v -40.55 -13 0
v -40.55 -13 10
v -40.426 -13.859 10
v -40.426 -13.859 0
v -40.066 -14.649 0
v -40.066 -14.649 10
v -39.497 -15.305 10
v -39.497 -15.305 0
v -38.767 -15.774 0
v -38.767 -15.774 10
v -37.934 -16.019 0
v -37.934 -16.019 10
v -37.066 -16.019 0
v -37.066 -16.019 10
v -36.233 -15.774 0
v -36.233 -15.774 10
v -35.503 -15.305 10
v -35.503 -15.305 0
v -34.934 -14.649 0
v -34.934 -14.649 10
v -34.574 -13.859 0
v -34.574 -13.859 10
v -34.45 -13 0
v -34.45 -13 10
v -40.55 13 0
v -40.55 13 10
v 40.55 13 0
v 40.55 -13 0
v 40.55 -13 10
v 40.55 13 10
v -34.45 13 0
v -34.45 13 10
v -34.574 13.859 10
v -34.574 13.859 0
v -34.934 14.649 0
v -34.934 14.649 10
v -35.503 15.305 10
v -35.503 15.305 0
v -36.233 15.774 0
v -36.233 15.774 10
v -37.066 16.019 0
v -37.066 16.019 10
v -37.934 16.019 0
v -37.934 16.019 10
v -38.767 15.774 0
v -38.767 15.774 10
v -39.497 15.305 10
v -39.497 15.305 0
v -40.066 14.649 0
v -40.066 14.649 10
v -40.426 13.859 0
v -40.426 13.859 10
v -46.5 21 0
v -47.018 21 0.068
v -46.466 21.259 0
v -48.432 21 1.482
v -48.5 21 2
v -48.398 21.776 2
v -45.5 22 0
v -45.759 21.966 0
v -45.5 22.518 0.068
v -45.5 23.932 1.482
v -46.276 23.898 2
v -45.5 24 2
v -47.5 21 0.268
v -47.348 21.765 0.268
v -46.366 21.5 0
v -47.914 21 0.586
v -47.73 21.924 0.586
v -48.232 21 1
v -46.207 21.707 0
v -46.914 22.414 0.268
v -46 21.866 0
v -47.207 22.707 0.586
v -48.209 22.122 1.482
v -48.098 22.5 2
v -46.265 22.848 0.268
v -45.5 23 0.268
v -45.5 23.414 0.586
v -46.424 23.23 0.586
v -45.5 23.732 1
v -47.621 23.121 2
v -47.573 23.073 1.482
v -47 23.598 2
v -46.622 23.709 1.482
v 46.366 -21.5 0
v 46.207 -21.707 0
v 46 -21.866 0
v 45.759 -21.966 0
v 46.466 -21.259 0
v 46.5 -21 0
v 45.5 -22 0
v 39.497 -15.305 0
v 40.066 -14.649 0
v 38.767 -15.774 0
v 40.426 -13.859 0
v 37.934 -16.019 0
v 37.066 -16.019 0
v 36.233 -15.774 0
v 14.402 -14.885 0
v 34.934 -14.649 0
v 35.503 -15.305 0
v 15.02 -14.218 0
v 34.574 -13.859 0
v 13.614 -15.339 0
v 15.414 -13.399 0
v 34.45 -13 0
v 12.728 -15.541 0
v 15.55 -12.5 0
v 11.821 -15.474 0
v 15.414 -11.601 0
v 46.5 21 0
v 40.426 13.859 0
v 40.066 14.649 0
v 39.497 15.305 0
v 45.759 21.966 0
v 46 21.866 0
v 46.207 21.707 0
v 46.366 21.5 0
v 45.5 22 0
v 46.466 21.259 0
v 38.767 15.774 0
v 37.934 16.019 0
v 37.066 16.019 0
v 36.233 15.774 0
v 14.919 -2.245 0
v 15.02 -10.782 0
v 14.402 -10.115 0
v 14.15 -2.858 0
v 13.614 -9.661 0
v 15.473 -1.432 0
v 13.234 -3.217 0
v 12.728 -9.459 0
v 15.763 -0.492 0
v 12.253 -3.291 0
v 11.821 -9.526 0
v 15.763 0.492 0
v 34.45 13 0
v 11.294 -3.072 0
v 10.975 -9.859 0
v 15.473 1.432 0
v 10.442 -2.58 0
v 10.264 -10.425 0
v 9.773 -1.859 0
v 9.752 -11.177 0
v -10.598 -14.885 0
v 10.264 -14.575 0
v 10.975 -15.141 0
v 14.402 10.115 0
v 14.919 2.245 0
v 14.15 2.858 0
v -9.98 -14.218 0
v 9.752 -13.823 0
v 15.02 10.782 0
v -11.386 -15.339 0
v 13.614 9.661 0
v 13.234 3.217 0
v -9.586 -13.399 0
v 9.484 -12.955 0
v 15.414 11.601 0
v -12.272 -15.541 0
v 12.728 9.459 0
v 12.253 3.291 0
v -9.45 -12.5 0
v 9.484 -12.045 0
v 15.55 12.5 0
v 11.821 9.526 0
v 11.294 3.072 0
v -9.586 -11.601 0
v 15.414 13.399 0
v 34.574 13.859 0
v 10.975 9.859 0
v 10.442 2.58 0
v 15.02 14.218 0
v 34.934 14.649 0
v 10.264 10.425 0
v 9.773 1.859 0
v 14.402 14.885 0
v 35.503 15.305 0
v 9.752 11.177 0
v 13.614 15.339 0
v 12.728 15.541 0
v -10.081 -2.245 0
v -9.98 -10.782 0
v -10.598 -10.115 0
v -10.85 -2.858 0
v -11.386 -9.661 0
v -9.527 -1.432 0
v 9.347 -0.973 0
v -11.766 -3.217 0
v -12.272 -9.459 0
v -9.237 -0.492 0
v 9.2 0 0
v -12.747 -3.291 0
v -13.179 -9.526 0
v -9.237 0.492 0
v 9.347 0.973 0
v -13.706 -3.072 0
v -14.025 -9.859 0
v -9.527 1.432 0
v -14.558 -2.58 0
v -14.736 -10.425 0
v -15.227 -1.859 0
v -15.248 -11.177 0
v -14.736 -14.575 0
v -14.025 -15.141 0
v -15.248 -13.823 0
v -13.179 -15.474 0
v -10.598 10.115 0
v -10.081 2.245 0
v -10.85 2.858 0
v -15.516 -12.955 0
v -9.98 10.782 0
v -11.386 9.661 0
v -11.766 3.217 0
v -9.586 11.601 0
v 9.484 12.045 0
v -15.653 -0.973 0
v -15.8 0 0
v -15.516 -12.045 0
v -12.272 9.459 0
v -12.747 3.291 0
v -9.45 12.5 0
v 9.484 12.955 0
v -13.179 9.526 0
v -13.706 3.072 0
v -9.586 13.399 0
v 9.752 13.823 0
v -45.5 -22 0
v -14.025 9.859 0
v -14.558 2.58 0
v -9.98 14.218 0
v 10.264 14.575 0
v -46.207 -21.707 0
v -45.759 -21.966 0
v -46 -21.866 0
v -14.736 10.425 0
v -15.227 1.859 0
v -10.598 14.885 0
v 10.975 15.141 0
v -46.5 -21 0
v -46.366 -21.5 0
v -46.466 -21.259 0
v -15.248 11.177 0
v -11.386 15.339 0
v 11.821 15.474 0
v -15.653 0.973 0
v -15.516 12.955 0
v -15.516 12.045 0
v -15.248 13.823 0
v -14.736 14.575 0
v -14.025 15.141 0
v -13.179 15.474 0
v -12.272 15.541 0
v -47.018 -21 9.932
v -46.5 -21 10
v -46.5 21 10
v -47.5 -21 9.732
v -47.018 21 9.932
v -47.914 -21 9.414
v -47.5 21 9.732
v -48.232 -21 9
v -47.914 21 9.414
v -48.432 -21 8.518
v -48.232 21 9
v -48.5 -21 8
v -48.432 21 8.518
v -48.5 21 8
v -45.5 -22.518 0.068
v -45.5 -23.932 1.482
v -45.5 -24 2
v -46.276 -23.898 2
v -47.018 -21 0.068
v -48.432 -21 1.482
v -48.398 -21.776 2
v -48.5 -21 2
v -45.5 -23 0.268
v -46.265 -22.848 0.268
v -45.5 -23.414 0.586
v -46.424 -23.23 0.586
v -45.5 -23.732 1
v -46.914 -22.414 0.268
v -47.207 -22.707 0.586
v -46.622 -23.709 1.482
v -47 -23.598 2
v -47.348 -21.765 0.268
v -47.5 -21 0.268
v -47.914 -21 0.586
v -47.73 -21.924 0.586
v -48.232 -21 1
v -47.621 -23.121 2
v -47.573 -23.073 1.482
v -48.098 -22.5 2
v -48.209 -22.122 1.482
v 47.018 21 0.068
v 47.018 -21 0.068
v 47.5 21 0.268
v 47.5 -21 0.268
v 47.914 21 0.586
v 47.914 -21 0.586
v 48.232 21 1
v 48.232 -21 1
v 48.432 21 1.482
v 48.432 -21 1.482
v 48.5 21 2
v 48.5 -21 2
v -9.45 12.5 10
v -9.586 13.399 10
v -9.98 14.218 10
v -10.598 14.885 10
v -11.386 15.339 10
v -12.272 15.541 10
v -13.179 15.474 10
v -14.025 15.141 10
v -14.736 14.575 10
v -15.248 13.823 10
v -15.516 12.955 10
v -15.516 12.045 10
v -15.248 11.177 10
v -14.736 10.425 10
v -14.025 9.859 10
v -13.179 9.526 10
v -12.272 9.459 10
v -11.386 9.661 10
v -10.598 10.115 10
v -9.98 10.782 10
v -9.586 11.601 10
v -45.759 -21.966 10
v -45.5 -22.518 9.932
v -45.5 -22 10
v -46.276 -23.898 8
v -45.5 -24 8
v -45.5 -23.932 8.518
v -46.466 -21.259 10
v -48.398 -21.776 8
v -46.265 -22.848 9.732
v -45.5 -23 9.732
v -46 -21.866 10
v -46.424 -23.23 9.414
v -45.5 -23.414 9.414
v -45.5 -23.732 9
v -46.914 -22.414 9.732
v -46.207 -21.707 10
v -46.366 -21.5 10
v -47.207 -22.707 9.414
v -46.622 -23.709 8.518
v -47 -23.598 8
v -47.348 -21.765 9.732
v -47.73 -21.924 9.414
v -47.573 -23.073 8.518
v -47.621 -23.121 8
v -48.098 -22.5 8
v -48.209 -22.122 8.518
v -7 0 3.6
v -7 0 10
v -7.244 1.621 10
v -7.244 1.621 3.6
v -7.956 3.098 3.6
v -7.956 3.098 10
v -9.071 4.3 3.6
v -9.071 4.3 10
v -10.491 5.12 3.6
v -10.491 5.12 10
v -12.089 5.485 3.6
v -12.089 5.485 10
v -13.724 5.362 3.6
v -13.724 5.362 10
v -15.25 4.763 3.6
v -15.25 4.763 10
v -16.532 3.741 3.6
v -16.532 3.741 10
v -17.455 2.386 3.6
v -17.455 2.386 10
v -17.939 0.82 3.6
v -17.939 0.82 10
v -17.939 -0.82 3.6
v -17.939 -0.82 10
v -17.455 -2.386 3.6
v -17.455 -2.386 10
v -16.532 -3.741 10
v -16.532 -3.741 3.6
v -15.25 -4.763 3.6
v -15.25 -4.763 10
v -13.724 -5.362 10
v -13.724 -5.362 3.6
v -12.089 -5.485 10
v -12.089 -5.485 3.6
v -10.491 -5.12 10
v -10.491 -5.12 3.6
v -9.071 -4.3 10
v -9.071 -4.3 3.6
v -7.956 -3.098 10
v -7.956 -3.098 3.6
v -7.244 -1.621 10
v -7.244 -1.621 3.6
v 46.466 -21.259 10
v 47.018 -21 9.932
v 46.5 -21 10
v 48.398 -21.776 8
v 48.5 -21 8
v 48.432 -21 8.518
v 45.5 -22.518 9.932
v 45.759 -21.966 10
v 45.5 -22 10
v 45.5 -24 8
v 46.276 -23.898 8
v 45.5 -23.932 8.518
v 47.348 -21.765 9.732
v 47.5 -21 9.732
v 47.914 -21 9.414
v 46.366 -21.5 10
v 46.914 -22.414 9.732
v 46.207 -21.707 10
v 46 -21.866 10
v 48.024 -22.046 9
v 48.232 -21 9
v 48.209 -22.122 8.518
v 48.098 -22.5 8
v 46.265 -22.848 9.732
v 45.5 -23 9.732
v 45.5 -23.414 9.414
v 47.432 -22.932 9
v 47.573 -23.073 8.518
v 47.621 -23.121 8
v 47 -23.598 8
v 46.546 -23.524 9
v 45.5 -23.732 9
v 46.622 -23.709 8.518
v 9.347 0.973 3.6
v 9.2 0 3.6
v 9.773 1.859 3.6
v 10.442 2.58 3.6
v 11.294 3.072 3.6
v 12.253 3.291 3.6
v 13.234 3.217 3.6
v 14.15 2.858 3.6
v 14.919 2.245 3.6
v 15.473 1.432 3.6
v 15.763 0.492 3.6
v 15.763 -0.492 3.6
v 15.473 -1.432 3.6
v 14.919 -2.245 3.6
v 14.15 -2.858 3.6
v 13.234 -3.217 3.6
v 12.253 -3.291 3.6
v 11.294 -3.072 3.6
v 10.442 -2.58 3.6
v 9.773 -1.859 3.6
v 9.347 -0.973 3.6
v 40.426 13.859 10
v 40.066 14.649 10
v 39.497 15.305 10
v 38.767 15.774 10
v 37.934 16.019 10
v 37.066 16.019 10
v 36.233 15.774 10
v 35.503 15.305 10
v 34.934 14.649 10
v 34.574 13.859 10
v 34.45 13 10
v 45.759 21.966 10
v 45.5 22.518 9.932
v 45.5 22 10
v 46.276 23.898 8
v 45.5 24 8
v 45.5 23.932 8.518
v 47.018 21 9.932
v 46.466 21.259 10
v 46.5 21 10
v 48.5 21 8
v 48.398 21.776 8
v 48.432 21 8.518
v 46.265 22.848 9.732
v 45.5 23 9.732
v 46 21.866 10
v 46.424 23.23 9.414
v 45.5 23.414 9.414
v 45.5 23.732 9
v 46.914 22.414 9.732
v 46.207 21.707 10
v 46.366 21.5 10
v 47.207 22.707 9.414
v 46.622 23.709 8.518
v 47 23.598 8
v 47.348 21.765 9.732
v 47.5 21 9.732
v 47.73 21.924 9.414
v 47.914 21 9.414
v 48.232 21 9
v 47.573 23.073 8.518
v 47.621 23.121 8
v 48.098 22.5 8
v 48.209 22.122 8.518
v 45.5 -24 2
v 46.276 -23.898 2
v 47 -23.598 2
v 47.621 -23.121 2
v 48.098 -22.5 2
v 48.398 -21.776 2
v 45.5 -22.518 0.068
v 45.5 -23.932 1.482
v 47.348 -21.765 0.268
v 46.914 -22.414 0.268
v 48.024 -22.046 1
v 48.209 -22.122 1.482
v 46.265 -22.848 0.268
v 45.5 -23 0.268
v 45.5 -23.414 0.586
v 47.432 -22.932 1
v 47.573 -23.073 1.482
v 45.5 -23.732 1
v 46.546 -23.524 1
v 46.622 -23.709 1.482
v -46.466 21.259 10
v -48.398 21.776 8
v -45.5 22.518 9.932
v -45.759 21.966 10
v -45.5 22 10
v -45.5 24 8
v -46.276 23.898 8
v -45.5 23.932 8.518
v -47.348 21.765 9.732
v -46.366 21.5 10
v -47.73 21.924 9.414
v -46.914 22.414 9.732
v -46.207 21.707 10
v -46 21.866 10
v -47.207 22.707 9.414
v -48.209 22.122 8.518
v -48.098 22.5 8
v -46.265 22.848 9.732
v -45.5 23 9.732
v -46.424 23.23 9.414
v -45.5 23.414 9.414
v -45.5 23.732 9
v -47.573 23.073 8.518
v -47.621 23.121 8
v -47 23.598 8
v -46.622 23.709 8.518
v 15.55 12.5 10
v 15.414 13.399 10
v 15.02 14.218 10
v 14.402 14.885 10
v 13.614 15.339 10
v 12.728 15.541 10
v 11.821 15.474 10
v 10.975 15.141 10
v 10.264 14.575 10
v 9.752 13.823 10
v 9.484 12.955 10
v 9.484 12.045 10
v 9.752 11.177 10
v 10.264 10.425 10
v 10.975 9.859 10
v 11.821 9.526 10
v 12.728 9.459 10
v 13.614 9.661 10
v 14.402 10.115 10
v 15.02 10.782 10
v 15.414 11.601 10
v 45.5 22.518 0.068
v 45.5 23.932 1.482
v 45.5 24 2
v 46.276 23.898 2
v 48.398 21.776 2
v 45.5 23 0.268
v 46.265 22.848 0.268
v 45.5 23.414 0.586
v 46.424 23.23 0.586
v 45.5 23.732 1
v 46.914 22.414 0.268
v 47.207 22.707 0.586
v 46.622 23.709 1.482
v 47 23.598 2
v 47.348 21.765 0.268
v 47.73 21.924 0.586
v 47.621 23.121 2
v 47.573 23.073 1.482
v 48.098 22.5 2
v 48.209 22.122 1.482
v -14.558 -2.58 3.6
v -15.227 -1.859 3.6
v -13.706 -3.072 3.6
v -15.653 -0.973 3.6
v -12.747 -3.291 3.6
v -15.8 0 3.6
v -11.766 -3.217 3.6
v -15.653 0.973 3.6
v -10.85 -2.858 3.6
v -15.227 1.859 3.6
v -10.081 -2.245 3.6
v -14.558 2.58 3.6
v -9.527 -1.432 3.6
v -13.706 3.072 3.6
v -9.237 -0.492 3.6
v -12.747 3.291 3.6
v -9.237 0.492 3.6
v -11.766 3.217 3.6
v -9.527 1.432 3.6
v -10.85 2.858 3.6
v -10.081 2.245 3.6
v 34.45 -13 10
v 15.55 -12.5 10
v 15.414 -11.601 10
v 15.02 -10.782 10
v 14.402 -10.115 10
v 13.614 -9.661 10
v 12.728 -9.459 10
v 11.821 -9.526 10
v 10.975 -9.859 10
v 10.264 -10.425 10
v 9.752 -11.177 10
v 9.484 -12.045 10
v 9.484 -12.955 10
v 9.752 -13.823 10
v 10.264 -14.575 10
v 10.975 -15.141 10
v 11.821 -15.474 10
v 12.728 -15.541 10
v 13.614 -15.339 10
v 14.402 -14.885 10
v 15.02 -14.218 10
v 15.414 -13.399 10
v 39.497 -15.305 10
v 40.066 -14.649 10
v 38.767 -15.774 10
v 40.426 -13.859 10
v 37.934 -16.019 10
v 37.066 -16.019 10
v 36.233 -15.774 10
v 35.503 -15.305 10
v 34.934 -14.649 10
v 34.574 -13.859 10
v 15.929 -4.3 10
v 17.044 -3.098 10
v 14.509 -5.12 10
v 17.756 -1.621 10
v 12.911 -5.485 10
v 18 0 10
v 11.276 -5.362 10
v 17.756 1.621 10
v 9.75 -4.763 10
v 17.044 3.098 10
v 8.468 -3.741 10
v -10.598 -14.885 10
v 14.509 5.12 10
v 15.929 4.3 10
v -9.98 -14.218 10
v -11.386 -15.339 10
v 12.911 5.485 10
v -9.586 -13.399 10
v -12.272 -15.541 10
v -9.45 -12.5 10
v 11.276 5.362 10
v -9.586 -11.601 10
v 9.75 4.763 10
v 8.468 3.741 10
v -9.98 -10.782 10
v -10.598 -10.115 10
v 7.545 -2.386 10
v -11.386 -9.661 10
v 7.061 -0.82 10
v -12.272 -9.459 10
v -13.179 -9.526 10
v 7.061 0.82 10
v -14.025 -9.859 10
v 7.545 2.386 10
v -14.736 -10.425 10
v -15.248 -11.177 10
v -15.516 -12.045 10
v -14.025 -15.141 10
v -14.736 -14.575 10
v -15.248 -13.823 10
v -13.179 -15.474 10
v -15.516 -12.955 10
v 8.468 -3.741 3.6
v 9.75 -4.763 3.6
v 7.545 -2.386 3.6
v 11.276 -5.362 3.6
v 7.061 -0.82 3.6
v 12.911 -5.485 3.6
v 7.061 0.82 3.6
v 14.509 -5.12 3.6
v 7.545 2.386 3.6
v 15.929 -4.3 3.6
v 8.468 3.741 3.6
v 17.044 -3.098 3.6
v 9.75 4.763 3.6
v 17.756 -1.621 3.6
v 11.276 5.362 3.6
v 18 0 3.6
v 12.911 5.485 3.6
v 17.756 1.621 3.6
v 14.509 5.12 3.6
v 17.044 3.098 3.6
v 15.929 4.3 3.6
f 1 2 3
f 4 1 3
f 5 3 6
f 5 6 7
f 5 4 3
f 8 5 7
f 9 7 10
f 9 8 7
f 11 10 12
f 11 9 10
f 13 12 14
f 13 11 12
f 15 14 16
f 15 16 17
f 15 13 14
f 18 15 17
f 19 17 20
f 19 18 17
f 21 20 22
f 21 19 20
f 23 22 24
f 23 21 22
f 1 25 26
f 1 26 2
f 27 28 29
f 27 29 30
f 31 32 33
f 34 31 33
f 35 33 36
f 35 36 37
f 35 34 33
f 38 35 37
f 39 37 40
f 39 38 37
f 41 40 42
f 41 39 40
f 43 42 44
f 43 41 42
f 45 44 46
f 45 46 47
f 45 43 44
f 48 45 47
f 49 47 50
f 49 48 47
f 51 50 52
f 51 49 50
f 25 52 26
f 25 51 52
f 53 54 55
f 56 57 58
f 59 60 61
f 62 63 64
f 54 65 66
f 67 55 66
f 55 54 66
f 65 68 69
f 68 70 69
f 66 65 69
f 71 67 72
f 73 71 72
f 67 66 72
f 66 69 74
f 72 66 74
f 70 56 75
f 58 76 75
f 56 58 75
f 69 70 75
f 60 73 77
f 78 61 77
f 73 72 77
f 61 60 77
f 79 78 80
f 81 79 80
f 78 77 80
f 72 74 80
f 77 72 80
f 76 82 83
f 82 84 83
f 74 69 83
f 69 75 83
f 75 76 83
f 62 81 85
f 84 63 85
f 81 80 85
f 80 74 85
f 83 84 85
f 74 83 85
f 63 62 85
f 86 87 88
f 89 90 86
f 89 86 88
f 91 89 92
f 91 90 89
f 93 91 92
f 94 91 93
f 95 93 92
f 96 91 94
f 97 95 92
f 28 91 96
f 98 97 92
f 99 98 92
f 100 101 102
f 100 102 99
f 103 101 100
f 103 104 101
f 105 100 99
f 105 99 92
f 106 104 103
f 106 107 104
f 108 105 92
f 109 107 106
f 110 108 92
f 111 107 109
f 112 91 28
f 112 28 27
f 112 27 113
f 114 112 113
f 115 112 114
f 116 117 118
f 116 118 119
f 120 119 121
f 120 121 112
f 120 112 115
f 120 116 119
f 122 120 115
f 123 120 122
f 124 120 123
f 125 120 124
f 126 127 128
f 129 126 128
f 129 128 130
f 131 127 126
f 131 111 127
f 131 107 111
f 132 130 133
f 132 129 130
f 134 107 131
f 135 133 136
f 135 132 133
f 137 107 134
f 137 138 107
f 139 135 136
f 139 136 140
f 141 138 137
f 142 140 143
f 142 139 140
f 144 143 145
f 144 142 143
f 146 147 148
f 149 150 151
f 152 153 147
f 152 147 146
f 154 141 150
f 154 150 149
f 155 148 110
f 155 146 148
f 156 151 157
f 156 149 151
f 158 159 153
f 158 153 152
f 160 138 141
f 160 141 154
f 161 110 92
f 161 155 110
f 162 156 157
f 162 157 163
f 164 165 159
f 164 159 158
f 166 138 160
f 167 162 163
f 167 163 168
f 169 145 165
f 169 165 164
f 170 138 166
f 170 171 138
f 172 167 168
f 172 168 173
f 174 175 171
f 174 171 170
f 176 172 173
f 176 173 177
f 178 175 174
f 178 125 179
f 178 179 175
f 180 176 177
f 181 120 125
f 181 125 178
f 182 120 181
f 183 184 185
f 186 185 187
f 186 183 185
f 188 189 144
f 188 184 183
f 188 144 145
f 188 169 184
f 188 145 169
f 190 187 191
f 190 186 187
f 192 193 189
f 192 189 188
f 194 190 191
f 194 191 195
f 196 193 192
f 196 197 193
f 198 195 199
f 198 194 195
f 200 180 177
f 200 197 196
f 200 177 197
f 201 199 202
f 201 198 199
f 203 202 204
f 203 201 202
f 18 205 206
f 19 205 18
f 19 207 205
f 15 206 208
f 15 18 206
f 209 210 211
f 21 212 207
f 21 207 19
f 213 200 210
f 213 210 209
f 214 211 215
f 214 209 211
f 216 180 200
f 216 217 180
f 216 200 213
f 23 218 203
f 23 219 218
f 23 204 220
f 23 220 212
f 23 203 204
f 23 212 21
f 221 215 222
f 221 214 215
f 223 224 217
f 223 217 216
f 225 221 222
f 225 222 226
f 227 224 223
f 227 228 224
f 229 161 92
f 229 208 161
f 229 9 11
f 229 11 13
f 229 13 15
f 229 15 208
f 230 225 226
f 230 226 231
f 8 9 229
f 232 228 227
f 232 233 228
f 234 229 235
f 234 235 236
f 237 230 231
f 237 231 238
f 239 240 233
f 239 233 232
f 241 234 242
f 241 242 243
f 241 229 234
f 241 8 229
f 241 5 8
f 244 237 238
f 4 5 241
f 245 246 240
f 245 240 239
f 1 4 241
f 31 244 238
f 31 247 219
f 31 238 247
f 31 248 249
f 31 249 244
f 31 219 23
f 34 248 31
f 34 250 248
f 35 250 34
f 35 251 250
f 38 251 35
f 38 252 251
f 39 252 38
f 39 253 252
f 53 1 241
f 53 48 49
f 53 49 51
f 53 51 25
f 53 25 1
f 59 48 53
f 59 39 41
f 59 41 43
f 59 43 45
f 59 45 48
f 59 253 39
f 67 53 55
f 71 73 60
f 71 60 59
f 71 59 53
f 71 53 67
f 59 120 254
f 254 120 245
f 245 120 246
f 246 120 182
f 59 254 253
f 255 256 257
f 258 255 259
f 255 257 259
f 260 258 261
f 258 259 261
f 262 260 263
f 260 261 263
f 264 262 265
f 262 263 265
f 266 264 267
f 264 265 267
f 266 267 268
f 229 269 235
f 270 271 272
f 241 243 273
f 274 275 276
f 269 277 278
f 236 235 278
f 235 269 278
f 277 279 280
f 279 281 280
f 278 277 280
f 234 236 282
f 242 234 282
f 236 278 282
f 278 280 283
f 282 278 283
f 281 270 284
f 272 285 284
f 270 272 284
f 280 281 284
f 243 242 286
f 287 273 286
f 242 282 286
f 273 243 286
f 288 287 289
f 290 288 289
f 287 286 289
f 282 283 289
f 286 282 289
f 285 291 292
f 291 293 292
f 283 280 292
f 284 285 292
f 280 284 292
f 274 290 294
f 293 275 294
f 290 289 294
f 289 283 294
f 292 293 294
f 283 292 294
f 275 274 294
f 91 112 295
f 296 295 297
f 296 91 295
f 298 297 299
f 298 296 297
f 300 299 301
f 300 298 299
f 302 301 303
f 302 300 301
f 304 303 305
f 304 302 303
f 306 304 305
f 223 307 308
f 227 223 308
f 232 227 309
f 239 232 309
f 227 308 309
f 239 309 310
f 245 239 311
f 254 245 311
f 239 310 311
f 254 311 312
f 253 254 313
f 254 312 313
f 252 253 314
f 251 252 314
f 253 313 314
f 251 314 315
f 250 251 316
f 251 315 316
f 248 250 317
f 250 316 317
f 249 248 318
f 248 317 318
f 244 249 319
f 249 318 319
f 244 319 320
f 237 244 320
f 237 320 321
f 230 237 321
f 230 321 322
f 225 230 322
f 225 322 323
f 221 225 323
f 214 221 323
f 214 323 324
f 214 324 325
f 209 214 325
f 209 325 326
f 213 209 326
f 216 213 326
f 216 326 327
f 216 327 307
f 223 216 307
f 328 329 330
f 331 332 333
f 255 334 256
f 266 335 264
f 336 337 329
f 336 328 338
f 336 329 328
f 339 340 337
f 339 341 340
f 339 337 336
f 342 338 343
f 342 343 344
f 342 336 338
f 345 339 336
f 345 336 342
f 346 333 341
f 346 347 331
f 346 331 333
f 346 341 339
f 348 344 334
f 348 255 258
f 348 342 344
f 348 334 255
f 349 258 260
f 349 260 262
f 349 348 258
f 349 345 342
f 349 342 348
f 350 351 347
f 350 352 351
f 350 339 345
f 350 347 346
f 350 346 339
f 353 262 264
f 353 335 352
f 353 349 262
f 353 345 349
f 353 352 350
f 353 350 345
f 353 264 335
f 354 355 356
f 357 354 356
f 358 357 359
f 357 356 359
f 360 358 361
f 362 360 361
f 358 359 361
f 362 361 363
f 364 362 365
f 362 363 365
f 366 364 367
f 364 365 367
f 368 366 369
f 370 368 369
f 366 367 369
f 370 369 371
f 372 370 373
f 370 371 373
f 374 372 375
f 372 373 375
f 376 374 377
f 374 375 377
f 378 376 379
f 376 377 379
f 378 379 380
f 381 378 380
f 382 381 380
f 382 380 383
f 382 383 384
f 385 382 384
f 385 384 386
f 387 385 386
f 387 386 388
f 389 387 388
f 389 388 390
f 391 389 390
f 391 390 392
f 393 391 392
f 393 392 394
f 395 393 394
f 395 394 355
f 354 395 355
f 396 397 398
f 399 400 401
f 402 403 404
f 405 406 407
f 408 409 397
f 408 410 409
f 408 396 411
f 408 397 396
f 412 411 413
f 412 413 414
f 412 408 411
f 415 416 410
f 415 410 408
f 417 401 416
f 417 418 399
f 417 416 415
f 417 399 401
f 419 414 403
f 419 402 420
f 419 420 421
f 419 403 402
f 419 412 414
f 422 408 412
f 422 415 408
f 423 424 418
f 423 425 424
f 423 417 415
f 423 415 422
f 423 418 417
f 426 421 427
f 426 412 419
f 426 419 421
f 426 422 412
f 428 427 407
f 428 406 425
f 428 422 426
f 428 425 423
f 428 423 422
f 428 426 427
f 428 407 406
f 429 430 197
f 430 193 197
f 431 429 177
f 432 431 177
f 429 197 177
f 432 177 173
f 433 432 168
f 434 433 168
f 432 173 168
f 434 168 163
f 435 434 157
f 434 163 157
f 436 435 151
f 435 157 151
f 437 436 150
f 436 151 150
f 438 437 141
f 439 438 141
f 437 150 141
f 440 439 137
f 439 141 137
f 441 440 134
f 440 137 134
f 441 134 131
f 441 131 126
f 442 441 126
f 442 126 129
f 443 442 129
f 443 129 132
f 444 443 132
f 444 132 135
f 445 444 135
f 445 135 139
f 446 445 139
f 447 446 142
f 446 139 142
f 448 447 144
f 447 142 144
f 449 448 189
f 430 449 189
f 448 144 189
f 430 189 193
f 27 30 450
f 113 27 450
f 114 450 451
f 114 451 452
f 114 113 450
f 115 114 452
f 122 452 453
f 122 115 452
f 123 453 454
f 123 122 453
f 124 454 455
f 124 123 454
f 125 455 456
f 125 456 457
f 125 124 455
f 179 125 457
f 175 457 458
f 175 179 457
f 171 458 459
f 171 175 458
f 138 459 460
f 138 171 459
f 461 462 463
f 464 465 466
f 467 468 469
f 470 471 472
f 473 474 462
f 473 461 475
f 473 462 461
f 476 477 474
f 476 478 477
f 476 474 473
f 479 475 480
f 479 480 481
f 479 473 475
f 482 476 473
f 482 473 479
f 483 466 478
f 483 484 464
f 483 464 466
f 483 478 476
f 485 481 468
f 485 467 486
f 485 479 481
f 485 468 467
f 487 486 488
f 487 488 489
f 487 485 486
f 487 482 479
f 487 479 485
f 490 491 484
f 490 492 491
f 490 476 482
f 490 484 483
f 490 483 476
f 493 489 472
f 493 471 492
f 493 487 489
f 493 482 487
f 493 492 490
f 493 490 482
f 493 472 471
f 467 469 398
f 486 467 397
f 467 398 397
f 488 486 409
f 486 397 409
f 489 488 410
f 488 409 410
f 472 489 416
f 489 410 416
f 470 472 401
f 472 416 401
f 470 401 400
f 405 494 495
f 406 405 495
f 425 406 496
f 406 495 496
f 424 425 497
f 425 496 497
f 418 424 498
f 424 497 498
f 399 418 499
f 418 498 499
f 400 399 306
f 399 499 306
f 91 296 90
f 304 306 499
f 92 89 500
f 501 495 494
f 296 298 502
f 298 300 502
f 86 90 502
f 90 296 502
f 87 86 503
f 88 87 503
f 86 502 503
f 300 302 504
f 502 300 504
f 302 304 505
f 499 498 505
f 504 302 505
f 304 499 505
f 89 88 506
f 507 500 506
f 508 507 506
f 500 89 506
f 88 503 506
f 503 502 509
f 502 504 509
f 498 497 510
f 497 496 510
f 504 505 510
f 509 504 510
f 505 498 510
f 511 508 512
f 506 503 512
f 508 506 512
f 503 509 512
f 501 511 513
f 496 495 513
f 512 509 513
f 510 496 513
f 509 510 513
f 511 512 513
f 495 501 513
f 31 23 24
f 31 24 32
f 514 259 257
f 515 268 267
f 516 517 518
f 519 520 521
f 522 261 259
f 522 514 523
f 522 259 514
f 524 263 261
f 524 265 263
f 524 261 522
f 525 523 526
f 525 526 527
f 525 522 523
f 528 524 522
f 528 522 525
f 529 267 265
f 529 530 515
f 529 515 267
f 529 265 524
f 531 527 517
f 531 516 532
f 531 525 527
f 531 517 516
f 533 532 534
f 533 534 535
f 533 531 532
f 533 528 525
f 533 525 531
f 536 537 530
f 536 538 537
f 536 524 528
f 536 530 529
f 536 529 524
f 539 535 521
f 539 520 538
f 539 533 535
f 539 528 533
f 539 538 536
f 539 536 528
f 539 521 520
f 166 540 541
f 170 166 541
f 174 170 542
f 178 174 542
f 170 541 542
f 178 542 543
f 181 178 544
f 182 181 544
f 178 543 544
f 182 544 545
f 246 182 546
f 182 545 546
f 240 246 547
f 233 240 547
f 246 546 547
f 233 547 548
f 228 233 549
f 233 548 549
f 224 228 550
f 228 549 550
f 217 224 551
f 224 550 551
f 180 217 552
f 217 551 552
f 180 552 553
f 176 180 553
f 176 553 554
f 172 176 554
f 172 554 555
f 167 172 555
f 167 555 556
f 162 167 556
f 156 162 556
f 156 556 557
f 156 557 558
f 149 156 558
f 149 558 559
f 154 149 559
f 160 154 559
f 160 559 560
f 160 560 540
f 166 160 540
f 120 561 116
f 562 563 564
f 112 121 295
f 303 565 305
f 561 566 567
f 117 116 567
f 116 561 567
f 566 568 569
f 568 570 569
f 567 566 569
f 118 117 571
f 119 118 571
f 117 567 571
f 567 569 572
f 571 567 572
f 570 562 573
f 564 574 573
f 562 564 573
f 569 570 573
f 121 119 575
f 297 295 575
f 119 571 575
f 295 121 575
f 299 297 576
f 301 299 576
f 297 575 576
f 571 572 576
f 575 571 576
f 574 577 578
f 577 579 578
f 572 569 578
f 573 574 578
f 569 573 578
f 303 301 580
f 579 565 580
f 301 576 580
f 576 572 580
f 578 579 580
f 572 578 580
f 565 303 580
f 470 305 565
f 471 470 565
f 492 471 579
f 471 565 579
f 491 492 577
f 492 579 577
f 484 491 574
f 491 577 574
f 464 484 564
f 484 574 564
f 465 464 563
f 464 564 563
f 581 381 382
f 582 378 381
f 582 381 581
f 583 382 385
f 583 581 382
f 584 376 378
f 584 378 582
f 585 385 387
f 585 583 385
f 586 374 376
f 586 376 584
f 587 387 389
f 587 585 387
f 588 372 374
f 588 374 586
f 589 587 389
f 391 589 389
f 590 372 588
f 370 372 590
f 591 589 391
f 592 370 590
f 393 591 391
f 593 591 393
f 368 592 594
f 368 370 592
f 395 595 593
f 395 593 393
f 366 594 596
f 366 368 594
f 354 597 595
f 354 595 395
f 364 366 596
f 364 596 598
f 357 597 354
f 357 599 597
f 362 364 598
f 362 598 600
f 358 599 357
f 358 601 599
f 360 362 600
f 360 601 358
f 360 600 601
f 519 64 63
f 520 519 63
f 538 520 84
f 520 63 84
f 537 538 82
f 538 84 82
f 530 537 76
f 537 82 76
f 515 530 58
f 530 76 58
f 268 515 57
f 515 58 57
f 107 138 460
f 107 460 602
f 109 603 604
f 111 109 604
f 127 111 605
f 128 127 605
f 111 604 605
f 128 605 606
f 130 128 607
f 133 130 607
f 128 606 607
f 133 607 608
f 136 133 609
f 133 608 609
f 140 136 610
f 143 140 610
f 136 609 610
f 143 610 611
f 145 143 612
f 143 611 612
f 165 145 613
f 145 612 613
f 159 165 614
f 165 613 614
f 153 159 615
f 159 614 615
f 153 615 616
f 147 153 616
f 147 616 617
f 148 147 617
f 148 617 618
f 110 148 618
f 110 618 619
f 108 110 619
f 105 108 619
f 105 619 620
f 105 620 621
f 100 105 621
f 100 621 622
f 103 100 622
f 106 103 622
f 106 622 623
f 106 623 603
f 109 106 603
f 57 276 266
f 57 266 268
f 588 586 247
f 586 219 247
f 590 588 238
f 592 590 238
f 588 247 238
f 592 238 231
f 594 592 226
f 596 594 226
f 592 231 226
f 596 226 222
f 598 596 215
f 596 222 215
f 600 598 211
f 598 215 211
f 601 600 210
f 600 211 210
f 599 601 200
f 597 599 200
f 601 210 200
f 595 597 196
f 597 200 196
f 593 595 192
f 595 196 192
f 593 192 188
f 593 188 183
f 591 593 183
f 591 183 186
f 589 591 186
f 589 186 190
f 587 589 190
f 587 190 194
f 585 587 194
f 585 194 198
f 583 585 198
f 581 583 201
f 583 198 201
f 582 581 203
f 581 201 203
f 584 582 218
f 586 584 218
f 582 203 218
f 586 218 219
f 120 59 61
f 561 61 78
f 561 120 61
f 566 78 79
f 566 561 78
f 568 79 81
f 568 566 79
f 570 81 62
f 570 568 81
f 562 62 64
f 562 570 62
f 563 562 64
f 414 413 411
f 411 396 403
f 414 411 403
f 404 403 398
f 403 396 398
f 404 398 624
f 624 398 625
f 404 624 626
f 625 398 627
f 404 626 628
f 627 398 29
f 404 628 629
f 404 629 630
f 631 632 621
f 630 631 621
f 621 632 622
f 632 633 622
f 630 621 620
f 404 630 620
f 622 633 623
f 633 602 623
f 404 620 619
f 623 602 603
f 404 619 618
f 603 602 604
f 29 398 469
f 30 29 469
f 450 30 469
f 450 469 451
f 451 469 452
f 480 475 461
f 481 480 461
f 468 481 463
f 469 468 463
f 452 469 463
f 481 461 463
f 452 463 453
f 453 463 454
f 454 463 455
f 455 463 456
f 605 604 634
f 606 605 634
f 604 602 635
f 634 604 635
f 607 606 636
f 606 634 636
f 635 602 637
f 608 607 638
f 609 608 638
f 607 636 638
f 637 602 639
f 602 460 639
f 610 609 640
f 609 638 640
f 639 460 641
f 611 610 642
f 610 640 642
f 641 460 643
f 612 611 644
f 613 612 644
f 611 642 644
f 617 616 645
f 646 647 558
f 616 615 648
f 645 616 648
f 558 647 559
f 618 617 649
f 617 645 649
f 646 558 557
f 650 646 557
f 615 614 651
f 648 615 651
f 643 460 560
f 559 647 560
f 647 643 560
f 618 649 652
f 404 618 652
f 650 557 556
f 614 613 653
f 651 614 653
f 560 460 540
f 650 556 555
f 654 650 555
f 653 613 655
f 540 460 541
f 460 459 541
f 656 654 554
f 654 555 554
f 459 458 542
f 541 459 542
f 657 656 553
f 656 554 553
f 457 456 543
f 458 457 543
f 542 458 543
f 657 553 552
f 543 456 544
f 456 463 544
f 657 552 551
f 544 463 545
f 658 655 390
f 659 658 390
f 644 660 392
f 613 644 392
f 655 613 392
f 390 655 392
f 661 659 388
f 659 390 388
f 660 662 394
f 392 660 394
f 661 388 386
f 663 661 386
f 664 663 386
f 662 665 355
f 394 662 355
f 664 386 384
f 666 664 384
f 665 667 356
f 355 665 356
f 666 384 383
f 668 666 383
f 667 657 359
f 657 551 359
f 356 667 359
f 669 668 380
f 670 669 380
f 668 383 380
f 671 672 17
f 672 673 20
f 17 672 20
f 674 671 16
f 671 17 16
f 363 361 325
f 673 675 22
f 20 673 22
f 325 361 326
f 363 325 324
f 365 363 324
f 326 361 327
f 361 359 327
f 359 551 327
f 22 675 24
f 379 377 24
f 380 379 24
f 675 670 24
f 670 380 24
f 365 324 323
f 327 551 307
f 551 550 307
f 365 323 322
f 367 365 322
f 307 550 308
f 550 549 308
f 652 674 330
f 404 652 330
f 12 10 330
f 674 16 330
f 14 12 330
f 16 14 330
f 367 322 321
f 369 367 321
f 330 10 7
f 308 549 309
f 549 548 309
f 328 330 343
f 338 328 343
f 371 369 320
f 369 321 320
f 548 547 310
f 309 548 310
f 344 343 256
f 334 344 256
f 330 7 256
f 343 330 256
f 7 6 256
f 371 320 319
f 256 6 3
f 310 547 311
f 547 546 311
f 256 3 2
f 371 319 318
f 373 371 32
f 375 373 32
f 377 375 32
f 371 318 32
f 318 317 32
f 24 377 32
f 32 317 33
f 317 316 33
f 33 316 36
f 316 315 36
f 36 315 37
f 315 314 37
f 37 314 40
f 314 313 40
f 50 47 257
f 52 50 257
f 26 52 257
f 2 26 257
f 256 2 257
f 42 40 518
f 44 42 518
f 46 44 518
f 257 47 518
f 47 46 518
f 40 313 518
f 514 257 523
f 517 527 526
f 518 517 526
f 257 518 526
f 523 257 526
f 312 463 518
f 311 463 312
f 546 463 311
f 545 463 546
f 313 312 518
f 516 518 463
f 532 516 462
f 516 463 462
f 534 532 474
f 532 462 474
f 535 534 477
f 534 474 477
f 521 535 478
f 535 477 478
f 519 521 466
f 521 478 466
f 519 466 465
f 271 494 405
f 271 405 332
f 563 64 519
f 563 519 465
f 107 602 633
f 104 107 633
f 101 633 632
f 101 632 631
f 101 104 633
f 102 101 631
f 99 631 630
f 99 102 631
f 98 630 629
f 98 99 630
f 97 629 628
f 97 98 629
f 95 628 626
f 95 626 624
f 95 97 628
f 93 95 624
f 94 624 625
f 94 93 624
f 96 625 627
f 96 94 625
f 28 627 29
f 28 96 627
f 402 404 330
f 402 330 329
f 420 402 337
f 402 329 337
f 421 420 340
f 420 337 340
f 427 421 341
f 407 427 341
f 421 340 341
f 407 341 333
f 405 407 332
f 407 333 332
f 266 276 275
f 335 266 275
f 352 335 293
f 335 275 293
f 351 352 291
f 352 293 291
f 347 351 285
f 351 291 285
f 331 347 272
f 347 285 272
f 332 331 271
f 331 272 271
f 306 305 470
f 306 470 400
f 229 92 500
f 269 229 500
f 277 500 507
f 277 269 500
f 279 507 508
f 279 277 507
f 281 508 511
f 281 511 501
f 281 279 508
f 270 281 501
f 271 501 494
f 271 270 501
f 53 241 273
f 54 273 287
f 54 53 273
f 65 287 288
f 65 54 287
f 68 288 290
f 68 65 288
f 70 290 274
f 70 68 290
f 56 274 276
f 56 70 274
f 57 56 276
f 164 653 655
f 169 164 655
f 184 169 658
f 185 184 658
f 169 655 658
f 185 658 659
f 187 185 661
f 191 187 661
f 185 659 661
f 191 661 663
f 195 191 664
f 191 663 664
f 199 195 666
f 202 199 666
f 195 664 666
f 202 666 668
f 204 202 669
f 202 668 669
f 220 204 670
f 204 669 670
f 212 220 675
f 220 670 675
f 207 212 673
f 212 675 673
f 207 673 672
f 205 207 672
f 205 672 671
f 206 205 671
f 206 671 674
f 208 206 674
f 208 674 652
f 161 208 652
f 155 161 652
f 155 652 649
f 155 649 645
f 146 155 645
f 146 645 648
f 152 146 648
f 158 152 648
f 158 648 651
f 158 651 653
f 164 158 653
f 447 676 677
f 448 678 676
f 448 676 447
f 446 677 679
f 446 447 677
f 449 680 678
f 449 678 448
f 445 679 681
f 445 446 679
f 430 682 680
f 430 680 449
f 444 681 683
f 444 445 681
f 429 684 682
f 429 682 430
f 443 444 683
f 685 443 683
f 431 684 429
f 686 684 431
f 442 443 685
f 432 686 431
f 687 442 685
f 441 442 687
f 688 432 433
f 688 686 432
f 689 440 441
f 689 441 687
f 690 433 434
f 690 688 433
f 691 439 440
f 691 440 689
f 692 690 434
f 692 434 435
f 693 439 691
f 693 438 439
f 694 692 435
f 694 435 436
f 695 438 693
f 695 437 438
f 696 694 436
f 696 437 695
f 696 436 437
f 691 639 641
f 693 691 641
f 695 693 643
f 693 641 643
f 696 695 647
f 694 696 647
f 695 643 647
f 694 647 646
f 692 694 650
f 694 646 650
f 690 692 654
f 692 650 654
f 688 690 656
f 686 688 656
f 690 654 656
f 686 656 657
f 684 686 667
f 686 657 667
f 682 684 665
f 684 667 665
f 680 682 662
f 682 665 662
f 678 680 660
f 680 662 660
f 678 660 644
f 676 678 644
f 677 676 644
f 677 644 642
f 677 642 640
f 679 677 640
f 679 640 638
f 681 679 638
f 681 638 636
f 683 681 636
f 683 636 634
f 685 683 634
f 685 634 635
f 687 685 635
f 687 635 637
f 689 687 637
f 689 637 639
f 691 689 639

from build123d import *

# Parameters (mm, degrees)
PAD_DEPTH        = 10
SKETCH001_R      = 3.05
POCKET_DEPTH     = 10.001
FILLET_R         = 2
FILLET001_R      = 2
HOLE_D           = 6.6
HOLE_DEPTH       = 25
HOLE_CBORE_D     = 11
HOLE_CBORE_DEPTH = 6.4


with BuildPart() as part:
    # Sketch → Pad (new body)
    with BuildSketch(Plane.XY):
        with BuildLine():
            Line((-45.5, 24), (45.5, 24))
            ThreePointArc((48.5, 21), (47.62132, 23.12132), (45.5, 24))
            Line((48.5, 21), (48.5, -21))
            ThreePointArc((45.5, -24), (47.62132, -23.12132), (48.5, -21))
            Line((45.5, -24), (-45.5, -24))
            ThreePointArc((-48.5, -21), (-47.62132, -23.12132), (-45.5, -24))
            Line((-48.5, -21), (-48.5, 21))
            ThreePointArc((-45.5, 24), (-47.62132, 23.12132), (-48.5, 21))
        make_face()
        with BuildLine():
            ThreePointArc((40.55, 13), (37.5, 16.05), (34.45, 13))
            Line((34.45, 13), (34.45, -13))
            ThreePointArc((34.45, -13), (37.5, -16.05), (40.55, -13))
            Line((40.55, -13), (40.55, 13))
        make_face(mode=Mode.SUBTRACT)
        with BuildLine():
            ThreePointArc((-34.45, 13), (-37.5, 16.05), (-40.55, 13))
            Line((-40.55, 13), (-40.55, -13))
            ThreePointArc((-40.55, -13), (-37.5, -16.05), (-34.45, -13))
            Line((-34.45, -13), (-34.45, 13))
        make_face(mode=Mode.SUBTRACT)
    extrude(amount=PAD_DEPTH)

    # Sketch001 (on Face18 of Pad) → Pocket (cut, through all)
    with BuildSketch(Plane.XY.offset(10)):
        with Locations((-12.5, 12.5)):
            Circle(SKETCH001_R)
        with Locations((12.5, 12.5)):
            Circle(SKETCH001_R)
        with Locations((-12.5, -12.5)):
            Circle(SKETCH001_R)
        with Locations((12.5, -12.5)):
            Circle(SKETCH001_R)
    extrude(amount=-POCKET_DEPTH, mode=Mode.SUBTRACT)

    # Fillet
    fillet_edges = [part.edges().sort_by_distance(p)[0] for p in [
        (0, -24, 10),
    ]]
    fillet(fillet_edges, radius=FILLET_R)

    # Fillet001
    fillet001_edges = [part.edges().sort_by_distance(p)[0] for p in [
        (0, -24, 0),
    ]]
    fillet(fillet001_edges, radius=FILLET001_R)

    # Hole
    with Locations(Plane.XY.offset(10)):
        with Locations((12.5, 0), (-12.5, 0)):
            CounterBoreHole(HOLE_D / 2, HOLE_CBORE_D / 2, HOLE_CBORE_DEPTH, depth=HOLE_DEPTH)


solid = part.part
